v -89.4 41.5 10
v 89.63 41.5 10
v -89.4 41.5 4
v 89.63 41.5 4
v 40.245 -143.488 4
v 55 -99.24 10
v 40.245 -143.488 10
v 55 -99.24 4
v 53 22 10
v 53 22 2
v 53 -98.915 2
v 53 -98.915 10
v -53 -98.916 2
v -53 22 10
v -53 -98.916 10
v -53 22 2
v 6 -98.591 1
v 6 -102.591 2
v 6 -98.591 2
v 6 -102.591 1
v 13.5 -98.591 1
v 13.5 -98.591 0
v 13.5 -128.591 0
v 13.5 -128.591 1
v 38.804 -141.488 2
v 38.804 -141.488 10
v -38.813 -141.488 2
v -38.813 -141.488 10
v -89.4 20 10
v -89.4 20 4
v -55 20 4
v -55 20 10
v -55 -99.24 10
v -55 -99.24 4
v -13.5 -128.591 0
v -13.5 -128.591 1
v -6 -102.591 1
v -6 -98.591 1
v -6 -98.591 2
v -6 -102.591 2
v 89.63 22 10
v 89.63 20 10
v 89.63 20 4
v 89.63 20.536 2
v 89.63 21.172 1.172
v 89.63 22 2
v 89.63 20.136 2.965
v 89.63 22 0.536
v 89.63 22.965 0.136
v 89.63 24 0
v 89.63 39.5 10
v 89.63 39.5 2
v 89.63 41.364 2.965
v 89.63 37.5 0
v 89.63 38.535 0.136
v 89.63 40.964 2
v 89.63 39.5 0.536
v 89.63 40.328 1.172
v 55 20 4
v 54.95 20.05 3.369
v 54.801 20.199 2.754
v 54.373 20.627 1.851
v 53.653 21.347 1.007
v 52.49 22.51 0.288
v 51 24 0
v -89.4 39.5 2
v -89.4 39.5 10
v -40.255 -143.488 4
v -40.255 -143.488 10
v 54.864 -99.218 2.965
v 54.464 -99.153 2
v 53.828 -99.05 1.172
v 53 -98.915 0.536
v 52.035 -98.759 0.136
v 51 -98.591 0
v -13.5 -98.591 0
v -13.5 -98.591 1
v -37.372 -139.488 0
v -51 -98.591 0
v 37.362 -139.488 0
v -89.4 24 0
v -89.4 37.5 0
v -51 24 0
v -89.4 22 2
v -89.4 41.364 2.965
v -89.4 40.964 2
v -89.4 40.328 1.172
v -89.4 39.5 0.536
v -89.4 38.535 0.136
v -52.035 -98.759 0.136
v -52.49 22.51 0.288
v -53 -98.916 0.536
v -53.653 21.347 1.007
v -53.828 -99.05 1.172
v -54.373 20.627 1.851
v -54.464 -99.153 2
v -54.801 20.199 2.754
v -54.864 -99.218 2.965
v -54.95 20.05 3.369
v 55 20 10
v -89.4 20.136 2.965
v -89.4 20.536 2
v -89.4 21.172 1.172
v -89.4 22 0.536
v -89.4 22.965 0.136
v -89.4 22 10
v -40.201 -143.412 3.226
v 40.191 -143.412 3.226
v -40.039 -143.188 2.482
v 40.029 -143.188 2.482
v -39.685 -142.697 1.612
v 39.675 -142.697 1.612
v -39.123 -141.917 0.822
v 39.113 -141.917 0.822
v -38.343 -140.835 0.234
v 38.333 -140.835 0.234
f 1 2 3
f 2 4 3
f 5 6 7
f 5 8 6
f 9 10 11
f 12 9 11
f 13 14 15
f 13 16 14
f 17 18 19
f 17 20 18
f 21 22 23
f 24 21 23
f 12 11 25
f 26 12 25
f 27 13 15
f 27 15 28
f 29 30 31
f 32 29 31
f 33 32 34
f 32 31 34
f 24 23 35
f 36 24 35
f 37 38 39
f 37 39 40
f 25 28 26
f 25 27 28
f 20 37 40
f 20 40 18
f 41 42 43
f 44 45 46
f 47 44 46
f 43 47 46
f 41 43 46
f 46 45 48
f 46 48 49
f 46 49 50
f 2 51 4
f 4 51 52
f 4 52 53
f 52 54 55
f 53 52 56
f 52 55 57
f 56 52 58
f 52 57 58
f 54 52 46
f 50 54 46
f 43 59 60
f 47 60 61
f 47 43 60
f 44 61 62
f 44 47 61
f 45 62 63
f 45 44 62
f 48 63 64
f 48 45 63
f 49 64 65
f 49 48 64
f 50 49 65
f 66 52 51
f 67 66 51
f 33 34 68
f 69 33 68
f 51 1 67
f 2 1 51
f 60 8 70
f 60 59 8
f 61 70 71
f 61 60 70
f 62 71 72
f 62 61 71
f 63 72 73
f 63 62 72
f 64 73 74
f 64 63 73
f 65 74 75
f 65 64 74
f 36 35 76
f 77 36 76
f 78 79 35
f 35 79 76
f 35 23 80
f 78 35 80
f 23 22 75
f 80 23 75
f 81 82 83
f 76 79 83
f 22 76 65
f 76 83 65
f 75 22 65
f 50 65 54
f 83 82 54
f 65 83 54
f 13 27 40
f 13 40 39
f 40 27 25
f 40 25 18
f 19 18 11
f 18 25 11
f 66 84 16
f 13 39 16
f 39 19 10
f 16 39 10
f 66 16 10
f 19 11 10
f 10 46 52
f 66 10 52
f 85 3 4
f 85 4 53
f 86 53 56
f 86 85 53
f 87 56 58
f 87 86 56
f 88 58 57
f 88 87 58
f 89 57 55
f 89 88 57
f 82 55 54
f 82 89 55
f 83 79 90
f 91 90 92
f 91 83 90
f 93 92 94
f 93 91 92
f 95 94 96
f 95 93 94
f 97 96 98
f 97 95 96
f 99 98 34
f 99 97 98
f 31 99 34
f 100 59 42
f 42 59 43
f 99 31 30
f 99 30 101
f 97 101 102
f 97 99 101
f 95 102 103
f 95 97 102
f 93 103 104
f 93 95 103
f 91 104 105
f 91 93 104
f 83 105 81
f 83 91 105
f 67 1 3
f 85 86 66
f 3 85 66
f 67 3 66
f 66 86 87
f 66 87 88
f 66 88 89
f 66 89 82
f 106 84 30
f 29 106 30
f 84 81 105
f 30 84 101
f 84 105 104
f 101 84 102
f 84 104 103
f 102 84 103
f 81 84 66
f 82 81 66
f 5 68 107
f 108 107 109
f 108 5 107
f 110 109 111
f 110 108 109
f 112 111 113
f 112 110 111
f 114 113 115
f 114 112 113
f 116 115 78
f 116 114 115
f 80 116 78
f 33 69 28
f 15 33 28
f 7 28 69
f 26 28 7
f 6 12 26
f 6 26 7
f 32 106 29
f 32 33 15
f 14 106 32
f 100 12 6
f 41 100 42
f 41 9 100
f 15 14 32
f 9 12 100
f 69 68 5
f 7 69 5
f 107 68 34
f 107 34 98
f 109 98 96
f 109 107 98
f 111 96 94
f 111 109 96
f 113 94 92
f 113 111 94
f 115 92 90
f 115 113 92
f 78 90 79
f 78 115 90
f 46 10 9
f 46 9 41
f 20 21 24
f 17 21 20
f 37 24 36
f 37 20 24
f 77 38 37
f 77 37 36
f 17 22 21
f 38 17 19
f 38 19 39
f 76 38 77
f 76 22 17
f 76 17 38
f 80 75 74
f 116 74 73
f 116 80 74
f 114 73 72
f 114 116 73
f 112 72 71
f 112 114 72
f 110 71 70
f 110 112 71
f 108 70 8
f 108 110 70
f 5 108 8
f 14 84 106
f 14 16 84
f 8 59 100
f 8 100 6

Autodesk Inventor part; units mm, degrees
ref_plane "YZ Plane" through (0, 0, 0) normal (1, 0, 0) x (0, 1, 0)
ref_plane "XZ Plane" through (0, 0, 0) normal (0, 1, 0) x (-1, 0, 0)
ref_plane "XY Plane" through (0, 0, 0) normal (0, 0, 1) x (1, 0, 0)
sketch "스케치18" plane through (0, 0, 0) normal (0, 0, 1) x (1, 0, 0)
  line L0 (55, 0) -> (55, 20)
  line L1 (55, 20) -> (89.63, 20)
  line L2 (89.63, 20) -> (89.63, 41.5)
  line L3 (89.63, 41.5) -> (-89.4, 41.5)
  line L4 (-89.4, 41.5) -> (-89.4, 20)
  line L5 (-89.4, 20) -> (-55, 20)
  line L6 (-55, 20) -> (-55, -55)
  line L7 (55, 0) -> (55, -55)
  line L8 (-55, -55) -> (-55, -99.24)
  line L9 (-55, -99.24) -> (-40.255, -143.4879)
  line L10 (-40.255, -143.4879) -> (40.245, -143.4879)
  line L11 (55, -55) -> (55, -99.24)
  line L12 (55, -99.24) -> (40.245, -143.4879)
  point P0 (0, 0)
  dimension "d111" = 179.03
  dimension "d112" = 184.9879
  dimension "d113" = 34.4
extrude "돌출13" add sketch "스케치18" along normal blind 10
shell "쉘4" thickness 2 removed faces 1 at (-18.3333, -11.6667, 10)
sketch "스케치23" plane through (87.63, 22, 2) normal (-1, 0, 0) x (0, 0, 1)
  line L0 (0, 0) -> (8, 0) projected
  line L1 (0, 0) -> (0, 17.5) projected
  line L2 (8, 0) -> (0, 0)
  line L3 (0, 0) -> (0, 17.5)
  line L4 (0, 17.5) -> (8, 17.5)
  line L5 (8, 17.5) -> (8, 0)
  point P0 (-2, -22)
extrude "돌출16" cut sketch "스케치23" along normal mid plane 600
fillet "모깎기6" radius 4 8 edges at (0.115, 41.5, 0) (72.315, 20, 0) (-72.2, 20, 0) (-55, -39.62, 0) (55, -39.62, 0) (47.6225, -121.3639, 0) (-0.005, -143.4879, 0) (-47.6275, -121.3639, 0)
sketch "스케치24" plane through (0, 0, 0) normal (0, 0, -1) x (-1, 0, 0)
  line L0 (0, -98.5907) -> (-13.5, -98.5907)
  line L1 (0, -98.5907) -> (13.5, -98.5907)
  line L2 (-13.5, -98.5907) -> (-13.5, -128.5907)
  line L3 (-13.5, -128.5907) -> (0, -128.5907)
  line L4 (0, -128.5907) -> (13.5, -128.5907)
  line L5 (13.5, -128.5907) -> (13.5, -98.5907)
  line L6 (0, -98.5907) -> (6, -98.5907)
  line L7 (6, -98.5907) -> (6, -102.5907)
  line L8 (6, -102.5907) -> (-6, -102.5907)
  line L9 (-6, -102.5907) -> (-6, -98.5907)
  point P0 (0, 0)
  dimension "d136" = 6
  dimension "d137" = 4
  dimension "d138" = 12
extrude "돌출17" cut sketch "스케치24" against normal blind 1
sketch "스케치25" plane through (0, 0, 1) normal (0, 0, -1) x (-1, 0, 0)
  line L0 (-13.5, -98.5907) -> (13.5, -98.5907) projected
  line L1 (0, -98.5907) -> (6, -98.5907)
  line L2 (6, -98.5907) -> (6, -102.5907)
  line L3 (6, -102.5907) -> (-6, -102.5907)
  line L4 (-6, -102.5907) -> (-6, -98.5907)
  line L5 (-6, -98.5907) -> (0, -98.5907)
  point P0 (0, 0)
  dimension "d139" = 6
  dimension "d140" = 4
  dimension "d141" = 12
extrude "돌출18" cut sketch "스케치25" against normal blind 2
sketch "스케치26" plane through (0, 0, 0) normal (0, 0, -1) x (-1, 0, 0)
  point P0 (0, 0)
properties part number "8.7_수정본"
